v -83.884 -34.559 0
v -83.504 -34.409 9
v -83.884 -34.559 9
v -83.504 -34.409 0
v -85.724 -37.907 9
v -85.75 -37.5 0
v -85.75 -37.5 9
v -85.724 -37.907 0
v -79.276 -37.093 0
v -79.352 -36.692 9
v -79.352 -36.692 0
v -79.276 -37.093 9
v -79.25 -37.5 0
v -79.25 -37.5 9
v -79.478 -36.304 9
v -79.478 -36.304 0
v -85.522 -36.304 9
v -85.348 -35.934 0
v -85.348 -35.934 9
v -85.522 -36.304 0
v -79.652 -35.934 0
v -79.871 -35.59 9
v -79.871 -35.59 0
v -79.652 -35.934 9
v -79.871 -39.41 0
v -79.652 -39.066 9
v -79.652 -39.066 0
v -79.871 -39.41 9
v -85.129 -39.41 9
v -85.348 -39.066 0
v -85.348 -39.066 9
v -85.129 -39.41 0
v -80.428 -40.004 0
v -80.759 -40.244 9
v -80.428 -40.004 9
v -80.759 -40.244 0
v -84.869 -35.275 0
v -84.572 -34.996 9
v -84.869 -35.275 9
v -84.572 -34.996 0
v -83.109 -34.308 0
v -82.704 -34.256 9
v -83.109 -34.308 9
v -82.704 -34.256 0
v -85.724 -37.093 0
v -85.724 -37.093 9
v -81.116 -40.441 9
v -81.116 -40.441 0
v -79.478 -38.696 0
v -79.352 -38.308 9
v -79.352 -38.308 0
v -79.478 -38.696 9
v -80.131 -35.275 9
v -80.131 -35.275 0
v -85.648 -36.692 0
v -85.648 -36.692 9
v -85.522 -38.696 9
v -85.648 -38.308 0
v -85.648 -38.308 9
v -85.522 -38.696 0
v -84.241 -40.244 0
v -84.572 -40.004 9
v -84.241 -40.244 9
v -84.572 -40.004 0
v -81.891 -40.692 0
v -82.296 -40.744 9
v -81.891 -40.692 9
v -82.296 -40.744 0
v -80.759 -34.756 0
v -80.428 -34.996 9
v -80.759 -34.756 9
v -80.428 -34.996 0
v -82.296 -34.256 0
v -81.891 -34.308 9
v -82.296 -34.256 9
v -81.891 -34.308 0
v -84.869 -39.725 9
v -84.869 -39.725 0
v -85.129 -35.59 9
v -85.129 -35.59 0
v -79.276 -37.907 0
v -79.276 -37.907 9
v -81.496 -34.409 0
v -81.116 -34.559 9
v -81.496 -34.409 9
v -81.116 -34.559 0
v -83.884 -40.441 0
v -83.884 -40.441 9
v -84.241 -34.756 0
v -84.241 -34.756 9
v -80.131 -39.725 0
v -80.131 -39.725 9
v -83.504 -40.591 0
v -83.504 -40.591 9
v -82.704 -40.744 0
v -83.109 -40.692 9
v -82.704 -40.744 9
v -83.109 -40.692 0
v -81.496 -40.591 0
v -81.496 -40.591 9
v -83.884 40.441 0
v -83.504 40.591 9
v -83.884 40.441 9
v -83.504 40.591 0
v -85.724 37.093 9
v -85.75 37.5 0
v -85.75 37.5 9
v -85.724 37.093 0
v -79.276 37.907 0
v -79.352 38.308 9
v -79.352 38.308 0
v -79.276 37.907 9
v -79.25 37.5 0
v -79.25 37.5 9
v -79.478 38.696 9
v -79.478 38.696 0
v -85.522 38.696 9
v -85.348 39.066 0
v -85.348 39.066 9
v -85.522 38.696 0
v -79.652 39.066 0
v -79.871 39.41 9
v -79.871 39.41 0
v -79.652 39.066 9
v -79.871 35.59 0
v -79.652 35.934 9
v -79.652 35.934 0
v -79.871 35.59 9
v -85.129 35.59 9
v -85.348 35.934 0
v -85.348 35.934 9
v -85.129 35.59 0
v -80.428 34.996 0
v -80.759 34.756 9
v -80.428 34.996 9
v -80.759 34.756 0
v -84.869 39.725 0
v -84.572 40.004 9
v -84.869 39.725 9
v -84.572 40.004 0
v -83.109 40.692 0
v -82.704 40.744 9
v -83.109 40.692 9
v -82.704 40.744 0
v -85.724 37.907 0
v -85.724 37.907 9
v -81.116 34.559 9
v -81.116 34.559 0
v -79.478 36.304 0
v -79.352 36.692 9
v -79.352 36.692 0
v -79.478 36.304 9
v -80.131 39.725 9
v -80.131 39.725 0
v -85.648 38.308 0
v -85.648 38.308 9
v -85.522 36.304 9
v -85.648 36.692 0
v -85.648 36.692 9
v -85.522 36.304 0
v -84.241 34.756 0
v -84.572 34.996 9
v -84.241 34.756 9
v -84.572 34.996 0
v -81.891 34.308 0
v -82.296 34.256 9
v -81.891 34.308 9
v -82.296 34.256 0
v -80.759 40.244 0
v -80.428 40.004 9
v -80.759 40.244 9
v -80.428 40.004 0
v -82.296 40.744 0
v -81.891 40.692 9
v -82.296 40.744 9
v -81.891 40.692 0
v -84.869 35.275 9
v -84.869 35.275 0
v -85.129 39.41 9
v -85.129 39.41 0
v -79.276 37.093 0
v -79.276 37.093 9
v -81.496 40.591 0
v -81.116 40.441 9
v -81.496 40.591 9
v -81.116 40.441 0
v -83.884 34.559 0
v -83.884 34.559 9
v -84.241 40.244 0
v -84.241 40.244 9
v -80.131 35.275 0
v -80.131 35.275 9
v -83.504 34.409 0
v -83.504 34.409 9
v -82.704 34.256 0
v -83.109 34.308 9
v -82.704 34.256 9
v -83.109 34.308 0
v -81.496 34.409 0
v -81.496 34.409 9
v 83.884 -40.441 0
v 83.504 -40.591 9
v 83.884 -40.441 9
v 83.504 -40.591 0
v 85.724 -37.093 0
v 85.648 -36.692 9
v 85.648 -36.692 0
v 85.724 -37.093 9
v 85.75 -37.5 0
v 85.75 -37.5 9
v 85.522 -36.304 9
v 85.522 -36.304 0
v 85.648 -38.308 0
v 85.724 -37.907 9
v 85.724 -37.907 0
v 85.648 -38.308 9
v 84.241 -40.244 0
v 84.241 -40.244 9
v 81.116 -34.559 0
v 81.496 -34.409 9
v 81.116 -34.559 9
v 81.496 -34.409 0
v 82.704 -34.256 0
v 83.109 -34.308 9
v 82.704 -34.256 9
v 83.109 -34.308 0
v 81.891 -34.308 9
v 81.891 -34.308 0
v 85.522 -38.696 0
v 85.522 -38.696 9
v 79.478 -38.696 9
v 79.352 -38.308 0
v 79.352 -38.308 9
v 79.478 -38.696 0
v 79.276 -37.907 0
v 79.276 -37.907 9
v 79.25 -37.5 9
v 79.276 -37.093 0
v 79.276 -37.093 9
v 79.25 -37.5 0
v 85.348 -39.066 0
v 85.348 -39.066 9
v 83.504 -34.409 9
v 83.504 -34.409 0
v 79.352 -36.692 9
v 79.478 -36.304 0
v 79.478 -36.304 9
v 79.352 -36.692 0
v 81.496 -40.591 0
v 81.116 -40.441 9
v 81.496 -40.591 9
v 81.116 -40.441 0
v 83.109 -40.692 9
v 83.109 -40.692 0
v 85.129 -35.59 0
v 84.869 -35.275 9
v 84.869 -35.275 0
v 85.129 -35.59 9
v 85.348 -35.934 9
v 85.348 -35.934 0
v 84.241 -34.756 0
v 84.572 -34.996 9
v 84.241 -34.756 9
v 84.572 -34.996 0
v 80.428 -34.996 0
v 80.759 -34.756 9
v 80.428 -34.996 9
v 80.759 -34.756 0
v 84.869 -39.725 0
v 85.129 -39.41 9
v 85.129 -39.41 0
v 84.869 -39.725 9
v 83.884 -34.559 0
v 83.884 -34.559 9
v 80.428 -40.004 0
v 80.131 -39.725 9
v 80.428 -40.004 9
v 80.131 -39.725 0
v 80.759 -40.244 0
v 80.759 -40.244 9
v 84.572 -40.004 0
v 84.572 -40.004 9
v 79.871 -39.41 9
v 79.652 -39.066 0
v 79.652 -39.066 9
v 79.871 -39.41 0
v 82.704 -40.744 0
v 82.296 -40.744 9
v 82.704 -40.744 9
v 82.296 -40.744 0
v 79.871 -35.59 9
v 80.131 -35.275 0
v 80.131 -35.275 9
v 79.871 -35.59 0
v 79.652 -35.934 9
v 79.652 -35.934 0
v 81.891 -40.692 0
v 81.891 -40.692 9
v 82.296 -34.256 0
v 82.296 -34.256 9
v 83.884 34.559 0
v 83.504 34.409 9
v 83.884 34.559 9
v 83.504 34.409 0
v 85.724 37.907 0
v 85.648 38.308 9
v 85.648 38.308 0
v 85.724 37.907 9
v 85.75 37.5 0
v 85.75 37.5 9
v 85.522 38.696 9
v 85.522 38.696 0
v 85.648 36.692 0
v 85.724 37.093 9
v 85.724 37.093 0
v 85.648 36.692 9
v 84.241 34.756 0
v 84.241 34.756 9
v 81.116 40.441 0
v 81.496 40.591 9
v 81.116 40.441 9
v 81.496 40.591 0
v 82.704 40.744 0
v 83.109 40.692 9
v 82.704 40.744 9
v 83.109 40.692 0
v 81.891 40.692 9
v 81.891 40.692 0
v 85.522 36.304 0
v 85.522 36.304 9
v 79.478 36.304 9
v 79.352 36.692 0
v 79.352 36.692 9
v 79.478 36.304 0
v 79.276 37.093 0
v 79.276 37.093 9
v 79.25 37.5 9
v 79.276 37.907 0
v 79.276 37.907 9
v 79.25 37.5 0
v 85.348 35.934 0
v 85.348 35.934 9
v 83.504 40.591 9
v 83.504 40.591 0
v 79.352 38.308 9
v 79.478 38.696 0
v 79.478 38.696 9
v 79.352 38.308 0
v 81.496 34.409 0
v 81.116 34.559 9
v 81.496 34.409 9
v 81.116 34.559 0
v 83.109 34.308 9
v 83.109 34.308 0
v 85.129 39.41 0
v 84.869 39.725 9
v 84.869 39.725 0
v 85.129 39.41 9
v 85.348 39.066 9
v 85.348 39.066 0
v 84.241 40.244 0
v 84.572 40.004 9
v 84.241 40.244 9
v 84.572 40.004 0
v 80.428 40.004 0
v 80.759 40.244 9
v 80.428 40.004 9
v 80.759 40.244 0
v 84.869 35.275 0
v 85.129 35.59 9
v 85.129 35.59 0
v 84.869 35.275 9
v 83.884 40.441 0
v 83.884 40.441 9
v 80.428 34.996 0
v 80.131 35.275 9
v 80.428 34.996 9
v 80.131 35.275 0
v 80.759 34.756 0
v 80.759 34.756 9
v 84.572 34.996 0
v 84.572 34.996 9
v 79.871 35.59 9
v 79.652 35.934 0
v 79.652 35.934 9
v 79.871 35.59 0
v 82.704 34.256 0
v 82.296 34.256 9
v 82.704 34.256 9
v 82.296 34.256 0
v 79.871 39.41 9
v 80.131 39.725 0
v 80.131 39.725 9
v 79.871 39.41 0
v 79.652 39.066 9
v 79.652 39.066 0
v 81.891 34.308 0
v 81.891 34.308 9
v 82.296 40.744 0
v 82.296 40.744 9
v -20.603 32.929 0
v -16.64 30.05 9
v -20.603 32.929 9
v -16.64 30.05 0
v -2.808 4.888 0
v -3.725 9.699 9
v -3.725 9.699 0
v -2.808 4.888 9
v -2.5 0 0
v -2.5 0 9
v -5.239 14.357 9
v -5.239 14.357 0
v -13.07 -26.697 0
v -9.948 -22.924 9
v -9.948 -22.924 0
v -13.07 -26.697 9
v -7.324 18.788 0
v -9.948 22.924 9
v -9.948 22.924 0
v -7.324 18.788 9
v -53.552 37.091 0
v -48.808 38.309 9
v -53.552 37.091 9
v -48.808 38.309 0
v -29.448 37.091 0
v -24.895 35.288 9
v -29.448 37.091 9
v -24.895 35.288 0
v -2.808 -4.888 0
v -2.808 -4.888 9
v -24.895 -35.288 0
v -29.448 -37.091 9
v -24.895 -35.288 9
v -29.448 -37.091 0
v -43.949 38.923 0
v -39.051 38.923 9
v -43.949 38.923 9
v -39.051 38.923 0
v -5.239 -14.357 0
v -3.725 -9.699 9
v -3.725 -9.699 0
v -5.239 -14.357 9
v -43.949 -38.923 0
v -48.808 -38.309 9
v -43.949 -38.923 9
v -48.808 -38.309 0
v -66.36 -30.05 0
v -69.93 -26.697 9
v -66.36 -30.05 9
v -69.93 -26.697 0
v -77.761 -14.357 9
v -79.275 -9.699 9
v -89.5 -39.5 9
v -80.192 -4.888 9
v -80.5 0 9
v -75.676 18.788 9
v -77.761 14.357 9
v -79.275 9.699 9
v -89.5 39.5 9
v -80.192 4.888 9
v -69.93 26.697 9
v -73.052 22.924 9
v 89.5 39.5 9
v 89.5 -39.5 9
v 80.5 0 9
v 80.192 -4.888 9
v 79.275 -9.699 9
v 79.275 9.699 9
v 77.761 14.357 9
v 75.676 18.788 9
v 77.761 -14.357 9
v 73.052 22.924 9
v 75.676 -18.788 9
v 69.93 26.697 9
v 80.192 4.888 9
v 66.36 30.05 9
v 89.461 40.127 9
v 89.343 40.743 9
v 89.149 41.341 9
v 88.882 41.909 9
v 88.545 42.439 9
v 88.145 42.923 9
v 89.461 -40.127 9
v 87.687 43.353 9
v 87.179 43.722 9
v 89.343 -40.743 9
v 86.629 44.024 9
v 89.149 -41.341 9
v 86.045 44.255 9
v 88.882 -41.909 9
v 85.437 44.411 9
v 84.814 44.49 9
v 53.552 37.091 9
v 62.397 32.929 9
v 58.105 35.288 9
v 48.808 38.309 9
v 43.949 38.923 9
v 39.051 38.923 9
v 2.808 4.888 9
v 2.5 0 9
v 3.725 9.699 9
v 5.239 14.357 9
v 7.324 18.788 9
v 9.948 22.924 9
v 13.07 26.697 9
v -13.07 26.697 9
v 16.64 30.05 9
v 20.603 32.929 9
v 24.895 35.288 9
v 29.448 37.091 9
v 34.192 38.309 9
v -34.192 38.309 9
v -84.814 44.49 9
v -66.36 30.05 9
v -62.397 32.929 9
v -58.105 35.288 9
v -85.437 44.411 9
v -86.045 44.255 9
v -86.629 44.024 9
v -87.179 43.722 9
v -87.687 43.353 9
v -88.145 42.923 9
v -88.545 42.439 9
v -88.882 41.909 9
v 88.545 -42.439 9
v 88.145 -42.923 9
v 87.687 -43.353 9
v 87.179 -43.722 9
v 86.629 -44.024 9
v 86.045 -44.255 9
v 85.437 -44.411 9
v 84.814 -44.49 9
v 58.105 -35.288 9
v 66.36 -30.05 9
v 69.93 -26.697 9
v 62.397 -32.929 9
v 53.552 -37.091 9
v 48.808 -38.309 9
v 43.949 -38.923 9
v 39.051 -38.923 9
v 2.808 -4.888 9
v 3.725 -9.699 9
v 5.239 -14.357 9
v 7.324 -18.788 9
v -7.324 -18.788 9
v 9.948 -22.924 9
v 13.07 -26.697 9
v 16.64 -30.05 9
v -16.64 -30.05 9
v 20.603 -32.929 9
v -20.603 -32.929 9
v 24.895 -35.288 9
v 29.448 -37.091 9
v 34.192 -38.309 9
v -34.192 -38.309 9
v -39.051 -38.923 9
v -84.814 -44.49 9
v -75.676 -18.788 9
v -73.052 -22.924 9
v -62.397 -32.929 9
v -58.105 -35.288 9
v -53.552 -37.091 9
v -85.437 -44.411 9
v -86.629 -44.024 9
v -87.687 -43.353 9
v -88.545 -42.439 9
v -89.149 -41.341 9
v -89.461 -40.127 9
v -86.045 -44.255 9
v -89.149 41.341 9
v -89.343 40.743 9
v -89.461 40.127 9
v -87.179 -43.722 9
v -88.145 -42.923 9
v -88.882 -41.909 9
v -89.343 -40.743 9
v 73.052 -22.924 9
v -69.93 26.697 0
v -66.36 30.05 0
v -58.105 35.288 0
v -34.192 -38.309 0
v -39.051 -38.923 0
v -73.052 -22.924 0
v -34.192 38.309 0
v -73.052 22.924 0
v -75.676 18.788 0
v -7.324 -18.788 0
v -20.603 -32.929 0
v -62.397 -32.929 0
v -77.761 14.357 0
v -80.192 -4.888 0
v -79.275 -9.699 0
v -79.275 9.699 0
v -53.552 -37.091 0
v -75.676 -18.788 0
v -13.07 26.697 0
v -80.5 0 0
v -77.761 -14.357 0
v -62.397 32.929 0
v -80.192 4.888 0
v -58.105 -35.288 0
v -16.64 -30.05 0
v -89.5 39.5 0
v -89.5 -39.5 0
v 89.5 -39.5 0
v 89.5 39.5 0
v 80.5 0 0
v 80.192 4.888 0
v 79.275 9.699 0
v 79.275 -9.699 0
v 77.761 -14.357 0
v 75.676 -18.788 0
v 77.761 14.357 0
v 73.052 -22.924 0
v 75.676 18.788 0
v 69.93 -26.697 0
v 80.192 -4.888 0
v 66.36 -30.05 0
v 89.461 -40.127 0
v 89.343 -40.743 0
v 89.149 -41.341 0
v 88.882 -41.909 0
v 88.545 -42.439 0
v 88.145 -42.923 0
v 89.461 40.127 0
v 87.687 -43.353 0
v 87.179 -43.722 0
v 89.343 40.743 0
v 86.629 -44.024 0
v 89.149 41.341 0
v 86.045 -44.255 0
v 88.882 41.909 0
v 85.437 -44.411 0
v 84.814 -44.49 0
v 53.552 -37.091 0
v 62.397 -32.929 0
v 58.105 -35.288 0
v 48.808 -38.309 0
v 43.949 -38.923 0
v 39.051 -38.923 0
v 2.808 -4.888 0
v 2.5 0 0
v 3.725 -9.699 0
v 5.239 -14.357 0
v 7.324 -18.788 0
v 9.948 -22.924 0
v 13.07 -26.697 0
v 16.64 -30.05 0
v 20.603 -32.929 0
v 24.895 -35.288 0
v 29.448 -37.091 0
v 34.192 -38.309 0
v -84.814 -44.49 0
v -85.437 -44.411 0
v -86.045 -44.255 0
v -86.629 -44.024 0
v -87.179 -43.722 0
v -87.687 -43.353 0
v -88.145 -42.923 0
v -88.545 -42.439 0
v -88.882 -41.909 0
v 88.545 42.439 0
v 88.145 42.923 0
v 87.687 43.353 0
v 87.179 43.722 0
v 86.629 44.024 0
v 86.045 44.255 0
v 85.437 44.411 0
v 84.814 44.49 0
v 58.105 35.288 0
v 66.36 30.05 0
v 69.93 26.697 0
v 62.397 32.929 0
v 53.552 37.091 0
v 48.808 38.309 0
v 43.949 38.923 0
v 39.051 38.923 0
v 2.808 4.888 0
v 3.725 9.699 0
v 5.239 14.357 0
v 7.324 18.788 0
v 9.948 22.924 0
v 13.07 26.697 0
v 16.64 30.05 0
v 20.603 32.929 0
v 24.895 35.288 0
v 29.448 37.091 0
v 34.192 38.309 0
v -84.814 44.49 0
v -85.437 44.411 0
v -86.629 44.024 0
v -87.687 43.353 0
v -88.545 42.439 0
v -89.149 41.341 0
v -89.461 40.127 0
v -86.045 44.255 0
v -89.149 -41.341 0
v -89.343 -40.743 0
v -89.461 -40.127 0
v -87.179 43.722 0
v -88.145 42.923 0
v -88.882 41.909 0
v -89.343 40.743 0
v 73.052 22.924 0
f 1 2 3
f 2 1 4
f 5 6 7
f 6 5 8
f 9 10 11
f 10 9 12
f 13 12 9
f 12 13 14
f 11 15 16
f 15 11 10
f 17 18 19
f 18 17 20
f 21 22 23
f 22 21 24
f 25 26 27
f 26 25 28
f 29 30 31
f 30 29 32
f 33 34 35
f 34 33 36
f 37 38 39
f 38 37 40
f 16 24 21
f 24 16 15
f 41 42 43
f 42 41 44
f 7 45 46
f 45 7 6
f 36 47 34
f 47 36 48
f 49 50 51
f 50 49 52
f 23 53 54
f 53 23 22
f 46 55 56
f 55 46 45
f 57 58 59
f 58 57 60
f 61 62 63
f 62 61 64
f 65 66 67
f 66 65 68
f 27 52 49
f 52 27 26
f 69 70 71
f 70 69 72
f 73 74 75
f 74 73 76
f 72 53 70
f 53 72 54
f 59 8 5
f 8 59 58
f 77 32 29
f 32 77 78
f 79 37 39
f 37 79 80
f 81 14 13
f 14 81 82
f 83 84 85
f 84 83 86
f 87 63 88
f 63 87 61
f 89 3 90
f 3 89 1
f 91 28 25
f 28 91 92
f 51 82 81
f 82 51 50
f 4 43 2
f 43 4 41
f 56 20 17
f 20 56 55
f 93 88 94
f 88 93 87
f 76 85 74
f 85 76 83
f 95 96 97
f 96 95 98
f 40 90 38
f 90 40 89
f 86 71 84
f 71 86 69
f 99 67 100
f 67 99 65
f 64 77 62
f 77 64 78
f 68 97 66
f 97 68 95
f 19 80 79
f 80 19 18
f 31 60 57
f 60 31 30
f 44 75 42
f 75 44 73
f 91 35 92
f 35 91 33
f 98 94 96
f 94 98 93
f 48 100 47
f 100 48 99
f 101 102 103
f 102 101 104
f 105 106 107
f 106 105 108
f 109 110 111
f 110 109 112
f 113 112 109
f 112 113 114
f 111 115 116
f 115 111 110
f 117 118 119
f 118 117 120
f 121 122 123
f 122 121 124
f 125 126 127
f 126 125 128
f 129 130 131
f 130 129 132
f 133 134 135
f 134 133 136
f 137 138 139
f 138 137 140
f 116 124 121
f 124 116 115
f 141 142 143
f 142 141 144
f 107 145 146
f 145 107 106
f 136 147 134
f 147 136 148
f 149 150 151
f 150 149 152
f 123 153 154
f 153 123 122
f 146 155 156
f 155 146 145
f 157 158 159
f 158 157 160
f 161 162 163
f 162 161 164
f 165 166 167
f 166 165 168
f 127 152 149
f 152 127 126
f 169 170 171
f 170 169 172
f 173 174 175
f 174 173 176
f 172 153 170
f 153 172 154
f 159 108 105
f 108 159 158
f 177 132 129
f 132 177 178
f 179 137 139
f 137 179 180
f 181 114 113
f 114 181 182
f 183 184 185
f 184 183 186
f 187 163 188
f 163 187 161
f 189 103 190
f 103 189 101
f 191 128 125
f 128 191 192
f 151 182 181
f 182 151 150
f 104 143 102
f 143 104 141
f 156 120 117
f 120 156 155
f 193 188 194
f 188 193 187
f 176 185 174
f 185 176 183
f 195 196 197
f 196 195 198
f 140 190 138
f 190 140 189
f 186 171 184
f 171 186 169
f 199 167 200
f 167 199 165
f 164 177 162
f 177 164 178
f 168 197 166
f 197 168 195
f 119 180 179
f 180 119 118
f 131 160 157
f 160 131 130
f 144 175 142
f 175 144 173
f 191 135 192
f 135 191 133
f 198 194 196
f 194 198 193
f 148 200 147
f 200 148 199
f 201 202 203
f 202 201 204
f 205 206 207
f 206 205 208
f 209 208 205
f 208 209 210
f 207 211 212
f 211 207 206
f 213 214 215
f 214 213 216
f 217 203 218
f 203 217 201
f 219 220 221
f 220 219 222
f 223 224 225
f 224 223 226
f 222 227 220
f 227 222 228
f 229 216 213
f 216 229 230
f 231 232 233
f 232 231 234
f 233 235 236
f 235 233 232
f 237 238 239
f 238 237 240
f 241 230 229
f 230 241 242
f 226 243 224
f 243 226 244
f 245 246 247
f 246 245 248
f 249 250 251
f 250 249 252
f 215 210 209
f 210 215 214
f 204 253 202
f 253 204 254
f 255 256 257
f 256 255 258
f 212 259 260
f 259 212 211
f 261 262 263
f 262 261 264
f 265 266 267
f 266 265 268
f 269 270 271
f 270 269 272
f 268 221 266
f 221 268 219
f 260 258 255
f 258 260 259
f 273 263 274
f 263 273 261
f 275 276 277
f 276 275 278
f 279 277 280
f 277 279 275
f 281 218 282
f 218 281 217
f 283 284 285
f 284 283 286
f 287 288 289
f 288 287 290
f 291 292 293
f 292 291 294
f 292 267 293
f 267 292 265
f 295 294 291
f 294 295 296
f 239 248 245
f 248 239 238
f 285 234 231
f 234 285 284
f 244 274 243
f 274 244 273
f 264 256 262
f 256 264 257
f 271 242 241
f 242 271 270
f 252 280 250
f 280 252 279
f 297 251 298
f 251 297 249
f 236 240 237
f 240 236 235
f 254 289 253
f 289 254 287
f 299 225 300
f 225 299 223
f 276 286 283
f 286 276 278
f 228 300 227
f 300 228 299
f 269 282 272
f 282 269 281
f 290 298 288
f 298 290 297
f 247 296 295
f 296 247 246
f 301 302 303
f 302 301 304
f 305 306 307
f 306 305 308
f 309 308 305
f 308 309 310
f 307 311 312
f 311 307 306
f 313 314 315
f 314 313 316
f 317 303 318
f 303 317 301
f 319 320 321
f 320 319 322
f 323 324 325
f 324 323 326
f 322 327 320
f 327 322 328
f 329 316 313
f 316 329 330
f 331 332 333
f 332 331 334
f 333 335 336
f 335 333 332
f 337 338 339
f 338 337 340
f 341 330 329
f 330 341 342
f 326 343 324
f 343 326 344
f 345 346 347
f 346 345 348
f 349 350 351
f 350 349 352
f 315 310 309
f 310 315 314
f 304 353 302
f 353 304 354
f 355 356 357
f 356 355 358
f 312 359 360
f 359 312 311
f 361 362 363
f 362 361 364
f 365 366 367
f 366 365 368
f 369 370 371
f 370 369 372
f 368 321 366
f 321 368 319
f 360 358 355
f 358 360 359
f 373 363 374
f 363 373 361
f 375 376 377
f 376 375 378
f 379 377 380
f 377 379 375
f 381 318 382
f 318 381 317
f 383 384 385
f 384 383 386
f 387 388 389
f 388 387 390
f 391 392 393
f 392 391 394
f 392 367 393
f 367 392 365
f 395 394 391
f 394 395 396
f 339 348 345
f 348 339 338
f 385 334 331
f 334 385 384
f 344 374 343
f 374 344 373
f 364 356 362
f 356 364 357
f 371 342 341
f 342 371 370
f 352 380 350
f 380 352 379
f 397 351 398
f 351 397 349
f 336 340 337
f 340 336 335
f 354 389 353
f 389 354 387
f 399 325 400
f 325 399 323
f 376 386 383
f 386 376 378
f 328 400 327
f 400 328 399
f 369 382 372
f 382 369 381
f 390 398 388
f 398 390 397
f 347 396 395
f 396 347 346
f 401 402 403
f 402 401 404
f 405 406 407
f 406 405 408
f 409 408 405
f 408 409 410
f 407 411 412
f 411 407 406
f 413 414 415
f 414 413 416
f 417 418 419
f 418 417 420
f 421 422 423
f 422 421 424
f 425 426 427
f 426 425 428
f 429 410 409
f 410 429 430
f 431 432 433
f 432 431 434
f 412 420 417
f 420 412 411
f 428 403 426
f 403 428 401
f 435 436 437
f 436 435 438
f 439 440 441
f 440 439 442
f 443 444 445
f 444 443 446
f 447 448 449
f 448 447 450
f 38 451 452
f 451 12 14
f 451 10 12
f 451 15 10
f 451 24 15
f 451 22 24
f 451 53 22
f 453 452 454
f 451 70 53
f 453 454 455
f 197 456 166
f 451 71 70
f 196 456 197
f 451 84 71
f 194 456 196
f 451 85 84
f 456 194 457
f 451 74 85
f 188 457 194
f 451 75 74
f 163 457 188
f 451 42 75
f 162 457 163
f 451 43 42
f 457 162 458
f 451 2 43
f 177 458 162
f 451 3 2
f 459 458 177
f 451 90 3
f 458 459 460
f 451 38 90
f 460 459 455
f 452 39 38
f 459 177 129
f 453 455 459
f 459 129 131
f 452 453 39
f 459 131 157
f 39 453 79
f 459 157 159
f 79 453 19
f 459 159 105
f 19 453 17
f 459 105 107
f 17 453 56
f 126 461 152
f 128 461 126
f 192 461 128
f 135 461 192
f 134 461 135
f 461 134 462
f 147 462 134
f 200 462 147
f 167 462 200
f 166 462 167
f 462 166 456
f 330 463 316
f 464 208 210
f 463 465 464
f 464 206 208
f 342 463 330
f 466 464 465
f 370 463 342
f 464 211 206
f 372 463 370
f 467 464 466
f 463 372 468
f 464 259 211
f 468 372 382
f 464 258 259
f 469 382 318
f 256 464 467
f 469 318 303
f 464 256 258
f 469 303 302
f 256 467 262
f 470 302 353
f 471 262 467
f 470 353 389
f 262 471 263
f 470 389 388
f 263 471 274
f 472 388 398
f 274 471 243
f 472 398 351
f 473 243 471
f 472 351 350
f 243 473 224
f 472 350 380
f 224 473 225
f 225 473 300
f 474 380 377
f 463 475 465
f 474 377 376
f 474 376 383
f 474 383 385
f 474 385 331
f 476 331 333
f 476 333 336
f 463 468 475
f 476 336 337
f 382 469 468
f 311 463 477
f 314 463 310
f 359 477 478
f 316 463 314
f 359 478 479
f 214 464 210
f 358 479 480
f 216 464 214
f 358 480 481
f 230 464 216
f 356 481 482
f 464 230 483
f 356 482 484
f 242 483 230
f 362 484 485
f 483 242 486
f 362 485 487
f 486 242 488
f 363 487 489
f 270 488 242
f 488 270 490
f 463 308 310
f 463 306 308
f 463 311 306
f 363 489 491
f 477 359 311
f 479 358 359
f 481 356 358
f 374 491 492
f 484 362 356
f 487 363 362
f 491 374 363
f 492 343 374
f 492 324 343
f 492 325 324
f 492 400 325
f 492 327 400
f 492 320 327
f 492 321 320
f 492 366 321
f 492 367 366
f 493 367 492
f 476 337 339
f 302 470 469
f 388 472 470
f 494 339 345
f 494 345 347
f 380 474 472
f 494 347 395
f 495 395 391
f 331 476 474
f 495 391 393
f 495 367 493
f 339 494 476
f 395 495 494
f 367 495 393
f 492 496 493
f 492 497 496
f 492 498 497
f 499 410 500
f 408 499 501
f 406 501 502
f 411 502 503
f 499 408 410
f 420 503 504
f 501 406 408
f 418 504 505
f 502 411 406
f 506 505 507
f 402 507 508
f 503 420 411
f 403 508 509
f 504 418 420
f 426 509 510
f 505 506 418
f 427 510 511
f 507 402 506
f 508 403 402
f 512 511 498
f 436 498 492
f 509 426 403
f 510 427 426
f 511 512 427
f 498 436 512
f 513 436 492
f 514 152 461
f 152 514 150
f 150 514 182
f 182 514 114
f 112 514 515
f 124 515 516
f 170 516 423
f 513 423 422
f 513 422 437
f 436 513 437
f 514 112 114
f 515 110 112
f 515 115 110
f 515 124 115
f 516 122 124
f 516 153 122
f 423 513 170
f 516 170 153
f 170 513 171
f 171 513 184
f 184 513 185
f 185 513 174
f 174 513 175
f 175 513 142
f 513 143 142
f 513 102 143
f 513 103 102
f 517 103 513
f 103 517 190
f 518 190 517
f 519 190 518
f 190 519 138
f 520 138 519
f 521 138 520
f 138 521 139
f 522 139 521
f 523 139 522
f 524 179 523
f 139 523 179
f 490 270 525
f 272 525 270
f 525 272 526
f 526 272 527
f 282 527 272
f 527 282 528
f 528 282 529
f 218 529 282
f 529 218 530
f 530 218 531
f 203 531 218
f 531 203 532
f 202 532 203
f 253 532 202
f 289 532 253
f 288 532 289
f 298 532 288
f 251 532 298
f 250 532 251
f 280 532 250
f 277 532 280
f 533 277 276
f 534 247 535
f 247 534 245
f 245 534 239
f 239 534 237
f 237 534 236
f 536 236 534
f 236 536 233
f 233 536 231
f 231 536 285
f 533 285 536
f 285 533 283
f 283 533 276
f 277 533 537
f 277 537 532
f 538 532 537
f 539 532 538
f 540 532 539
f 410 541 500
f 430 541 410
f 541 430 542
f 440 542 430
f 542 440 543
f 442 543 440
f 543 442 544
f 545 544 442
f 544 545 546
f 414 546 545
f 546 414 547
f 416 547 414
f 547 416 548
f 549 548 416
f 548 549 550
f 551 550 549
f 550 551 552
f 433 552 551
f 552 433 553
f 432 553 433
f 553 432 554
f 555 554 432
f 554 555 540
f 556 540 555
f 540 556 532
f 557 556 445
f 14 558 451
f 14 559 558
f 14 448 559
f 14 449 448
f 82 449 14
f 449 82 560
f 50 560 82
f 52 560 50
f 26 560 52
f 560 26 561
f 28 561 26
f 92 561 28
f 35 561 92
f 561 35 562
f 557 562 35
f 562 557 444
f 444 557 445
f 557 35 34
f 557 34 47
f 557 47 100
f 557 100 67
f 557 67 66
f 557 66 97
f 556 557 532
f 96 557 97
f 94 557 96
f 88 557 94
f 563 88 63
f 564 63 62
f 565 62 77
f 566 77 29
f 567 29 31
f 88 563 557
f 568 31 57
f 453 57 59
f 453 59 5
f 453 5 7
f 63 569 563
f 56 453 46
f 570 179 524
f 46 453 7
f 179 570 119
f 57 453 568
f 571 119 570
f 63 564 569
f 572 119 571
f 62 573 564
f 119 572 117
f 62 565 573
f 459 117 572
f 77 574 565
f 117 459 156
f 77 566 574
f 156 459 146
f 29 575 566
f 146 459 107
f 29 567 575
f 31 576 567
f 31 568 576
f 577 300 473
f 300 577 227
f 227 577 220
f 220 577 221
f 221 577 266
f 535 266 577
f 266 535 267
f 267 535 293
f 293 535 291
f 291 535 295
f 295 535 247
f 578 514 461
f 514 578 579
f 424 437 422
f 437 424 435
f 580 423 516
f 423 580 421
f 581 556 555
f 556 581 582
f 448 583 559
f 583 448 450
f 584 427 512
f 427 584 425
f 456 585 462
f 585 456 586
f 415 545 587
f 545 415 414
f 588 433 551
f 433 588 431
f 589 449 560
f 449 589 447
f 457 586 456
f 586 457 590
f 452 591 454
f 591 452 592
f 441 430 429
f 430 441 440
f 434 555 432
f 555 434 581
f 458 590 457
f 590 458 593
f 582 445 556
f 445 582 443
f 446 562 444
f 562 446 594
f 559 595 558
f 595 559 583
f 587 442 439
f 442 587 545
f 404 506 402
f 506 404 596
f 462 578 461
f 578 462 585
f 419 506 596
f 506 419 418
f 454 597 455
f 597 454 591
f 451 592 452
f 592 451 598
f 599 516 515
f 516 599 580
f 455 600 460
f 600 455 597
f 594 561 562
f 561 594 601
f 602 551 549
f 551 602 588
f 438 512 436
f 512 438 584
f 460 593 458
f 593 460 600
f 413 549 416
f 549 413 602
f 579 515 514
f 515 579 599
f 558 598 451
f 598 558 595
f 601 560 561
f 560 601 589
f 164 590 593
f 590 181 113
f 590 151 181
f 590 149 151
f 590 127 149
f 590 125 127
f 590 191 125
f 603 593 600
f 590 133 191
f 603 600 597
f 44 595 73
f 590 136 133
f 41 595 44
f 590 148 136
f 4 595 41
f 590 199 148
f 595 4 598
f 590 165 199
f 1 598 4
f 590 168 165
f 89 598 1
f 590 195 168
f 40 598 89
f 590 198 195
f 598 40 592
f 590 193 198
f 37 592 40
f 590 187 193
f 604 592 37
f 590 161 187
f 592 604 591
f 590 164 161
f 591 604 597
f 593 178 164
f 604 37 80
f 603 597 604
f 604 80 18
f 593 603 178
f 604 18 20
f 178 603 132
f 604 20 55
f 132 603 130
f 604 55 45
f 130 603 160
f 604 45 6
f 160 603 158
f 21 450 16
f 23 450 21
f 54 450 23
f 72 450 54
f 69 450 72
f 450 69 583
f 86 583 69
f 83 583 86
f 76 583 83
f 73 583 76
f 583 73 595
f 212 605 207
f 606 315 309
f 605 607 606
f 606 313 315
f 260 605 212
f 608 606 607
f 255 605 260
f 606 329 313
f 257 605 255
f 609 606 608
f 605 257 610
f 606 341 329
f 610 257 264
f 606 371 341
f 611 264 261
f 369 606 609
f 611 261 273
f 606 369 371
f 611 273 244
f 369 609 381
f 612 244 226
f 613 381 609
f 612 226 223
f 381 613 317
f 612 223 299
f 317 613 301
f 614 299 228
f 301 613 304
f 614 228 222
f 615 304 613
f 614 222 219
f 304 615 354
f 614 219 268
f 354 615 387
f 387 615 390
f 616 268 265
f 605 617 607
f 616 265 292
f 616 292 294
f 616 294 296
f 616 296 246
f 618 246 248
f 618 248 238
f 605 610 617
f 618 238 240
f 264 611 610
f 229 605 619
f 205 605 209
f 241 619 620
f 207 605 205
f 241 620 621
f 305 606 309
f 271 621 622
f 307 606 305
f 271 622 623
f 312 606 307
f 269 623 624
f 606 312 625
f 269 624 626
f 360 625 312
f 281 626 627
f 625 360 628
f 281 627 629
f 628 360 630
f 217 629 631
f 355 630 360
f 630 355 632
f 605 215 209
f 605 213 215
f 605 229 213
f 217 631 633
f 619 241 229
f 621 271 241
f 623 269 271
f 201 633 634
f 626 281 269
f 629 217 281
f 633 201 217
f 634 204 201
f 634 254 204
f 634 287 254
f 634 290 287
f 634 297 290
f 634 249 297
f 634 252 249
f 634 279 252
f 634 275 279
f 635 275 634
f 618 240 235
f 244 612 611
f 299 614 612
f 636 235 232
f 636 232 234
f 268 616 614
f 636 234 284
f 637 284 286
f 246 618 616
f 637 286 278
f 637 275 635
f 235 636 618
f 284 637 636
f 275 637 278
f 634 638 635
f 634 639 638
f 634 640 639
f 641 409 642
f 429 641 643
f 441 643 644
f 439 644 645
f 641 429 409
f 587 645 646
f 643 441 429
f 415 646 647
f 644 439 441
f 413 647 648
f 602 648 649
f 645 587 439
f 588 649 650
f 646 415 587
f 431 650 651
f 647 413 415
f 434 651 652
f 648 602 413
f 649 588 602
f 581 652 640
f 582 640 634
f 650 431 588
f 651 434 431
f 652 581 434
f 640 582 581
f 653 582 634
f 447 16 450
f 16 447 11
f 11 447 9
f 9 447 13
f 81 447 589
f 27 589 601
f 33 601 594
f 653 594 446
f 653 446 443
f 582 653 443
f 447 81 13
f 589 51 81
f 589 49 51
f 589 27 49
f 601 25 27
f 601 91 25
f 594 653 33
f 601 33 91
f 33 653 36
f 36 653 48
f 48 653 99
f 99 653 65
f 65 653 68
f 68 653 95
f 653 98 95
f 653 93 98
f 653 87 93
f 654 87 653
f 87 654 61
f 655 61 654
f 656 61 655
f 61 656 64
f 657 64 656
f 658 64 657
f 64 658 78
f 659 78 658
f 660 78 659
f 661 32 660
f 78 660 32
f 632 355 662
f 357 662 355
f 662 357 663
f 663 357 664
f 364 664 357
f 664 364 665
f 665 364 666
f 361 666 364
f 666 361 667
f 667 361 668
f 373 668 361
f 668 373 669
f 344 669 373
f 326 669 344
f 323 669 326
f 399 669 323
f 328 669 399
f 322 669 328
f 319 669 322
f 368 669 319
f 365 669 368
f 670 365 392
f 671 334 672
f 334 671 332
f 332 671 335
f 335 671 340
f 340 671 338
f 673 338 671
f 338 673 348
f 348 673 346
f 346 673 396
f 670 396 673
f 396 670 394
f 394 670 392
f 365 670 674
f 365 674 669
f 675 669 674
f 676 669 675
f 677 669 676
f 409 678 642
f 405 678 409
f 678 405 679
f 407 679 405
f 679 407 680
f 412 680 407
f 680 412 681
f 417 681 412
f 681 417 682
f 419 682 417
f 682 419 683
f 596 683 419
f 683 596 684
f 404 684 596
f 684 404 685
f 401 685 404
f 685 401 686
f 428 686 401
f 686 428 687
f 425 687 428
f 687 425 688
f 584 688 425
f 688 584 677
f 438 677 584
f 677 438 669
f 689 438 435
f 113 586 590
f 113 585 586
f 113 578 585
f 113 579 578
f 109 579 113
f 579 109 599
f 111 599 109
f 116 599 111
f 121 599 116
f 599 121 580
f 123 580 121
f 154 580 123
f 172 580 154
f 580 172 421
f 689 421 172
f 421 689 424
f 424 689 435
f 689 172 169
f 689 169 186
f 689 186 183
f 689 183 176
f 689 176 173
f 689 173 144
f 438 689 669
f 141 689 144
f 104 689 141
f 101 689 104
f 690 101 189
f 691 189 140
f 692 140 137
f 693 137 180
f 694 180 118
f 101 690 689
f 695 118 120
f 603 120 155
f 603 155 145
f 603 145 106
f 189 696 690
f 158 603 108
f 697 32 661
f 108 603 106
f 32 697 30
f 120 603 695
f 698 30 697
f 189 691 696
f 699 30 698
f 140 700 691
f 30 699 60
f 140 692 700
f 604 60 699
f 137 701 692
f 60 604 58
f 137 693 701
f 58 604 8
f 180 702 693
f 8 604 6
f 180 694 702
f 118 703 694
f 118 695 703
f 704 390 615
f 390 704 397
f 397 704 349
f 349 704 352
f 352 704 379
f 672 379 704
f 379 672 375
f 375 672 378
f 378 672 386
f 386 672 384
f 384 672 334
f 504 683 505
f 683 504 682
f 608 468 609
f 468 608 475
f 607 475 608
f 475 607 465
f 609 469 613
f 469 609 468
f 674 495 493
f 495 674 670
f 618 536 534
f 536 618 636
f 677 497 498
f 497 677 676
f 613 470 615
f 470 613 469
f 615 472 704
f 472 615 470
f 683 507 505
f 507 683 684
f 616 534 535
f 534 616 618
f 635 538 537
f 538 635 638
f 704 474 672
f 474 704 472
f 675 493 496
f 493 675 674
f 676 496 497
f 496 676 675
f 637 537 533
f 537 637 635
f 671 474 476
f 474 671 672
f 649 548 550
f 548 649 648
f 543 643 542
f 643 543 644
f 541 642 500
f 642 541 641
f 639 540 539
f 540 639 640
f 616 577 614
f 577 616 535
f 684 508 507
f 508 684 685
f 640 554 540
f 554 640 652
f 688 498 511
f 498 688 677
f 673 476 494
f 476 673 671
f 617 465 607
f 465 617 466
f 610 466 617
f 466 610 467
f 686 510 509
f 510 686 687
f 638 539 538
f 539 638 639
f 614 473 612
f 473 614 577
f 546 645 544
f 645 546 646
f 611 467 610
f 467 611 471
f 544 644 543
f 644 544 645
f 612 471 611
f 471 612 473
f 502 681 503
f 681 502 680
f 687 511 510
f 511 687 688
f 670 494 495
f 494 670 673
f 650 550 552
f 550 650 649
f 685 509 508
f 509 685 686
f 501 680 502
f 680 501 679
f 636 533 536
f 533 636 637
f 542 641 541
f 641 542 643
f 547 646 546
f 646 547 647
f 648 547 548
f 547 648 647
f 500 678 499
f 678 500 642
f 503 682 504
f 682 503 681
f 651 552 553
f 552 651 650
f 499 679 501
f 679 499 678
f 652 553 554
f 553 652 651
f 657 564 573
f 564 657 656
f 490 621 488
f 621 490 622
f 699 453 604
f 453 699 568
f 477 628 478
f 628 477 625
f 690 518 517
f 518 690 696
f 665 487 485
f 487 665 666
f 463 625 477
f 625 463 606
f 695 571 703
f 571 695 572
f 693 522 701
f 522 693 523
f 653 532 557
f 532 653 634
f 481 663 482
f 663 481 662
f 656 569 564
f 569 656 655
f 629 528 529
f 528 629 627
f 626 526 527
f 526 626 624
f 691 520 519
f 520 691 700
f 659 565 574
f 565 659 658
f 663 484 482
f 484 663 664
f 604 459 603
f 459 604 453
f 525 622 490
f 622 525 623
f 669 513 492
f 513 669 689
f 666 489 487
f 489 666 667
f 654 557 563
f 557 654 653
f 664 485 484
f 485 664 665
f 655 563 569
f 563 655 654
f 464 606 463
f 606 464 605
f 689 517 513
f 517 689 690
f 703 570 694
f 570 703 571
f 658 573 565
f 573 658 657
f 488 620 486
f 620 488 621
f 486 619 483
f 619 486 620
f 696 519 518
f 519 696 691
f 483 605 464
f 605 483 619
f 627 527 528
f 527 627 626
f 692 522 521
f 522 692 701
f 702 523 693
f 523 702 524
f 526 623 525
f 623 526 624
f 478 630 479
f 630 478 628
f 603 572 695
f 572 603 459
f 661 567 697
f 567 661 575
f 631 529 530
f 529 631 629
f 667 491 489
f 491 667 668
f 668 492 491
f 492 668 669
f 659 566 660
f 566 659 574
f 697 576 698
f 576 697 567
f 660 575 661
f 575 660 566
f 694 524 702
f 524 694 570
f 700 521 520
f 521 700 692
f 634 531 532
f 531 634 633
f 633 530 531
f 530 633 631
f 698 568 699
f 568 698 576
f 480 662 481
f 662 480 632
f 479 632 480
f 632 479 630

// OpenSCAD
$fn = 50;


difference() {
	union() {
		hull() {
			translate(v = [-84.5000000000, 39.5000000000, 0]) {
				cylinder(h = 9, r = 5);
			}
			translate(v = [84.5000000000, 39.5000000000, 0]) {
				cylinder(h = 9, r = 5);
			}
			translate(v = [-84.5000000000, -39.5000000000, 0]) {
				cylinder(h = 9, r = 5);
			}
			translate(v = [84.5000000000, -39.5000000000, 0]) {
				cylinder(h = 9, r = 5);
			}
		}
	}
	union() {
		#translate(v = [-82.5000000000, -37.5000000000, -100.0000000000]) {
			cylinder(h = 200, r = 3.2500000000);
		}
		#translate(v = [-82.5000000000, 37.5000000000, -100.0000000000]) {
			cylinder(h = 200, r = 3.2500000000);
		}
		#translate(v = [82.5000000000, -37.5000000000, -100.0000000000]) {
			cylinder(h = 200, r = 3.2500000000);
		}
		#translate(v = [82.5000000000, 37.5000000000, -100.0000000000]) {
			cylinder(h = 200, r = 3.2500000000);
		}
		#translate(v = [-41.5000000000, 0, 0]) {
			cylinder(h = 9, r = 39.0000000000);
		}
		#translate(v = [41.5000000000, 0, 0]) {
			cylinder(h = 9, r = 39.0000000000);
		}
	}
}
